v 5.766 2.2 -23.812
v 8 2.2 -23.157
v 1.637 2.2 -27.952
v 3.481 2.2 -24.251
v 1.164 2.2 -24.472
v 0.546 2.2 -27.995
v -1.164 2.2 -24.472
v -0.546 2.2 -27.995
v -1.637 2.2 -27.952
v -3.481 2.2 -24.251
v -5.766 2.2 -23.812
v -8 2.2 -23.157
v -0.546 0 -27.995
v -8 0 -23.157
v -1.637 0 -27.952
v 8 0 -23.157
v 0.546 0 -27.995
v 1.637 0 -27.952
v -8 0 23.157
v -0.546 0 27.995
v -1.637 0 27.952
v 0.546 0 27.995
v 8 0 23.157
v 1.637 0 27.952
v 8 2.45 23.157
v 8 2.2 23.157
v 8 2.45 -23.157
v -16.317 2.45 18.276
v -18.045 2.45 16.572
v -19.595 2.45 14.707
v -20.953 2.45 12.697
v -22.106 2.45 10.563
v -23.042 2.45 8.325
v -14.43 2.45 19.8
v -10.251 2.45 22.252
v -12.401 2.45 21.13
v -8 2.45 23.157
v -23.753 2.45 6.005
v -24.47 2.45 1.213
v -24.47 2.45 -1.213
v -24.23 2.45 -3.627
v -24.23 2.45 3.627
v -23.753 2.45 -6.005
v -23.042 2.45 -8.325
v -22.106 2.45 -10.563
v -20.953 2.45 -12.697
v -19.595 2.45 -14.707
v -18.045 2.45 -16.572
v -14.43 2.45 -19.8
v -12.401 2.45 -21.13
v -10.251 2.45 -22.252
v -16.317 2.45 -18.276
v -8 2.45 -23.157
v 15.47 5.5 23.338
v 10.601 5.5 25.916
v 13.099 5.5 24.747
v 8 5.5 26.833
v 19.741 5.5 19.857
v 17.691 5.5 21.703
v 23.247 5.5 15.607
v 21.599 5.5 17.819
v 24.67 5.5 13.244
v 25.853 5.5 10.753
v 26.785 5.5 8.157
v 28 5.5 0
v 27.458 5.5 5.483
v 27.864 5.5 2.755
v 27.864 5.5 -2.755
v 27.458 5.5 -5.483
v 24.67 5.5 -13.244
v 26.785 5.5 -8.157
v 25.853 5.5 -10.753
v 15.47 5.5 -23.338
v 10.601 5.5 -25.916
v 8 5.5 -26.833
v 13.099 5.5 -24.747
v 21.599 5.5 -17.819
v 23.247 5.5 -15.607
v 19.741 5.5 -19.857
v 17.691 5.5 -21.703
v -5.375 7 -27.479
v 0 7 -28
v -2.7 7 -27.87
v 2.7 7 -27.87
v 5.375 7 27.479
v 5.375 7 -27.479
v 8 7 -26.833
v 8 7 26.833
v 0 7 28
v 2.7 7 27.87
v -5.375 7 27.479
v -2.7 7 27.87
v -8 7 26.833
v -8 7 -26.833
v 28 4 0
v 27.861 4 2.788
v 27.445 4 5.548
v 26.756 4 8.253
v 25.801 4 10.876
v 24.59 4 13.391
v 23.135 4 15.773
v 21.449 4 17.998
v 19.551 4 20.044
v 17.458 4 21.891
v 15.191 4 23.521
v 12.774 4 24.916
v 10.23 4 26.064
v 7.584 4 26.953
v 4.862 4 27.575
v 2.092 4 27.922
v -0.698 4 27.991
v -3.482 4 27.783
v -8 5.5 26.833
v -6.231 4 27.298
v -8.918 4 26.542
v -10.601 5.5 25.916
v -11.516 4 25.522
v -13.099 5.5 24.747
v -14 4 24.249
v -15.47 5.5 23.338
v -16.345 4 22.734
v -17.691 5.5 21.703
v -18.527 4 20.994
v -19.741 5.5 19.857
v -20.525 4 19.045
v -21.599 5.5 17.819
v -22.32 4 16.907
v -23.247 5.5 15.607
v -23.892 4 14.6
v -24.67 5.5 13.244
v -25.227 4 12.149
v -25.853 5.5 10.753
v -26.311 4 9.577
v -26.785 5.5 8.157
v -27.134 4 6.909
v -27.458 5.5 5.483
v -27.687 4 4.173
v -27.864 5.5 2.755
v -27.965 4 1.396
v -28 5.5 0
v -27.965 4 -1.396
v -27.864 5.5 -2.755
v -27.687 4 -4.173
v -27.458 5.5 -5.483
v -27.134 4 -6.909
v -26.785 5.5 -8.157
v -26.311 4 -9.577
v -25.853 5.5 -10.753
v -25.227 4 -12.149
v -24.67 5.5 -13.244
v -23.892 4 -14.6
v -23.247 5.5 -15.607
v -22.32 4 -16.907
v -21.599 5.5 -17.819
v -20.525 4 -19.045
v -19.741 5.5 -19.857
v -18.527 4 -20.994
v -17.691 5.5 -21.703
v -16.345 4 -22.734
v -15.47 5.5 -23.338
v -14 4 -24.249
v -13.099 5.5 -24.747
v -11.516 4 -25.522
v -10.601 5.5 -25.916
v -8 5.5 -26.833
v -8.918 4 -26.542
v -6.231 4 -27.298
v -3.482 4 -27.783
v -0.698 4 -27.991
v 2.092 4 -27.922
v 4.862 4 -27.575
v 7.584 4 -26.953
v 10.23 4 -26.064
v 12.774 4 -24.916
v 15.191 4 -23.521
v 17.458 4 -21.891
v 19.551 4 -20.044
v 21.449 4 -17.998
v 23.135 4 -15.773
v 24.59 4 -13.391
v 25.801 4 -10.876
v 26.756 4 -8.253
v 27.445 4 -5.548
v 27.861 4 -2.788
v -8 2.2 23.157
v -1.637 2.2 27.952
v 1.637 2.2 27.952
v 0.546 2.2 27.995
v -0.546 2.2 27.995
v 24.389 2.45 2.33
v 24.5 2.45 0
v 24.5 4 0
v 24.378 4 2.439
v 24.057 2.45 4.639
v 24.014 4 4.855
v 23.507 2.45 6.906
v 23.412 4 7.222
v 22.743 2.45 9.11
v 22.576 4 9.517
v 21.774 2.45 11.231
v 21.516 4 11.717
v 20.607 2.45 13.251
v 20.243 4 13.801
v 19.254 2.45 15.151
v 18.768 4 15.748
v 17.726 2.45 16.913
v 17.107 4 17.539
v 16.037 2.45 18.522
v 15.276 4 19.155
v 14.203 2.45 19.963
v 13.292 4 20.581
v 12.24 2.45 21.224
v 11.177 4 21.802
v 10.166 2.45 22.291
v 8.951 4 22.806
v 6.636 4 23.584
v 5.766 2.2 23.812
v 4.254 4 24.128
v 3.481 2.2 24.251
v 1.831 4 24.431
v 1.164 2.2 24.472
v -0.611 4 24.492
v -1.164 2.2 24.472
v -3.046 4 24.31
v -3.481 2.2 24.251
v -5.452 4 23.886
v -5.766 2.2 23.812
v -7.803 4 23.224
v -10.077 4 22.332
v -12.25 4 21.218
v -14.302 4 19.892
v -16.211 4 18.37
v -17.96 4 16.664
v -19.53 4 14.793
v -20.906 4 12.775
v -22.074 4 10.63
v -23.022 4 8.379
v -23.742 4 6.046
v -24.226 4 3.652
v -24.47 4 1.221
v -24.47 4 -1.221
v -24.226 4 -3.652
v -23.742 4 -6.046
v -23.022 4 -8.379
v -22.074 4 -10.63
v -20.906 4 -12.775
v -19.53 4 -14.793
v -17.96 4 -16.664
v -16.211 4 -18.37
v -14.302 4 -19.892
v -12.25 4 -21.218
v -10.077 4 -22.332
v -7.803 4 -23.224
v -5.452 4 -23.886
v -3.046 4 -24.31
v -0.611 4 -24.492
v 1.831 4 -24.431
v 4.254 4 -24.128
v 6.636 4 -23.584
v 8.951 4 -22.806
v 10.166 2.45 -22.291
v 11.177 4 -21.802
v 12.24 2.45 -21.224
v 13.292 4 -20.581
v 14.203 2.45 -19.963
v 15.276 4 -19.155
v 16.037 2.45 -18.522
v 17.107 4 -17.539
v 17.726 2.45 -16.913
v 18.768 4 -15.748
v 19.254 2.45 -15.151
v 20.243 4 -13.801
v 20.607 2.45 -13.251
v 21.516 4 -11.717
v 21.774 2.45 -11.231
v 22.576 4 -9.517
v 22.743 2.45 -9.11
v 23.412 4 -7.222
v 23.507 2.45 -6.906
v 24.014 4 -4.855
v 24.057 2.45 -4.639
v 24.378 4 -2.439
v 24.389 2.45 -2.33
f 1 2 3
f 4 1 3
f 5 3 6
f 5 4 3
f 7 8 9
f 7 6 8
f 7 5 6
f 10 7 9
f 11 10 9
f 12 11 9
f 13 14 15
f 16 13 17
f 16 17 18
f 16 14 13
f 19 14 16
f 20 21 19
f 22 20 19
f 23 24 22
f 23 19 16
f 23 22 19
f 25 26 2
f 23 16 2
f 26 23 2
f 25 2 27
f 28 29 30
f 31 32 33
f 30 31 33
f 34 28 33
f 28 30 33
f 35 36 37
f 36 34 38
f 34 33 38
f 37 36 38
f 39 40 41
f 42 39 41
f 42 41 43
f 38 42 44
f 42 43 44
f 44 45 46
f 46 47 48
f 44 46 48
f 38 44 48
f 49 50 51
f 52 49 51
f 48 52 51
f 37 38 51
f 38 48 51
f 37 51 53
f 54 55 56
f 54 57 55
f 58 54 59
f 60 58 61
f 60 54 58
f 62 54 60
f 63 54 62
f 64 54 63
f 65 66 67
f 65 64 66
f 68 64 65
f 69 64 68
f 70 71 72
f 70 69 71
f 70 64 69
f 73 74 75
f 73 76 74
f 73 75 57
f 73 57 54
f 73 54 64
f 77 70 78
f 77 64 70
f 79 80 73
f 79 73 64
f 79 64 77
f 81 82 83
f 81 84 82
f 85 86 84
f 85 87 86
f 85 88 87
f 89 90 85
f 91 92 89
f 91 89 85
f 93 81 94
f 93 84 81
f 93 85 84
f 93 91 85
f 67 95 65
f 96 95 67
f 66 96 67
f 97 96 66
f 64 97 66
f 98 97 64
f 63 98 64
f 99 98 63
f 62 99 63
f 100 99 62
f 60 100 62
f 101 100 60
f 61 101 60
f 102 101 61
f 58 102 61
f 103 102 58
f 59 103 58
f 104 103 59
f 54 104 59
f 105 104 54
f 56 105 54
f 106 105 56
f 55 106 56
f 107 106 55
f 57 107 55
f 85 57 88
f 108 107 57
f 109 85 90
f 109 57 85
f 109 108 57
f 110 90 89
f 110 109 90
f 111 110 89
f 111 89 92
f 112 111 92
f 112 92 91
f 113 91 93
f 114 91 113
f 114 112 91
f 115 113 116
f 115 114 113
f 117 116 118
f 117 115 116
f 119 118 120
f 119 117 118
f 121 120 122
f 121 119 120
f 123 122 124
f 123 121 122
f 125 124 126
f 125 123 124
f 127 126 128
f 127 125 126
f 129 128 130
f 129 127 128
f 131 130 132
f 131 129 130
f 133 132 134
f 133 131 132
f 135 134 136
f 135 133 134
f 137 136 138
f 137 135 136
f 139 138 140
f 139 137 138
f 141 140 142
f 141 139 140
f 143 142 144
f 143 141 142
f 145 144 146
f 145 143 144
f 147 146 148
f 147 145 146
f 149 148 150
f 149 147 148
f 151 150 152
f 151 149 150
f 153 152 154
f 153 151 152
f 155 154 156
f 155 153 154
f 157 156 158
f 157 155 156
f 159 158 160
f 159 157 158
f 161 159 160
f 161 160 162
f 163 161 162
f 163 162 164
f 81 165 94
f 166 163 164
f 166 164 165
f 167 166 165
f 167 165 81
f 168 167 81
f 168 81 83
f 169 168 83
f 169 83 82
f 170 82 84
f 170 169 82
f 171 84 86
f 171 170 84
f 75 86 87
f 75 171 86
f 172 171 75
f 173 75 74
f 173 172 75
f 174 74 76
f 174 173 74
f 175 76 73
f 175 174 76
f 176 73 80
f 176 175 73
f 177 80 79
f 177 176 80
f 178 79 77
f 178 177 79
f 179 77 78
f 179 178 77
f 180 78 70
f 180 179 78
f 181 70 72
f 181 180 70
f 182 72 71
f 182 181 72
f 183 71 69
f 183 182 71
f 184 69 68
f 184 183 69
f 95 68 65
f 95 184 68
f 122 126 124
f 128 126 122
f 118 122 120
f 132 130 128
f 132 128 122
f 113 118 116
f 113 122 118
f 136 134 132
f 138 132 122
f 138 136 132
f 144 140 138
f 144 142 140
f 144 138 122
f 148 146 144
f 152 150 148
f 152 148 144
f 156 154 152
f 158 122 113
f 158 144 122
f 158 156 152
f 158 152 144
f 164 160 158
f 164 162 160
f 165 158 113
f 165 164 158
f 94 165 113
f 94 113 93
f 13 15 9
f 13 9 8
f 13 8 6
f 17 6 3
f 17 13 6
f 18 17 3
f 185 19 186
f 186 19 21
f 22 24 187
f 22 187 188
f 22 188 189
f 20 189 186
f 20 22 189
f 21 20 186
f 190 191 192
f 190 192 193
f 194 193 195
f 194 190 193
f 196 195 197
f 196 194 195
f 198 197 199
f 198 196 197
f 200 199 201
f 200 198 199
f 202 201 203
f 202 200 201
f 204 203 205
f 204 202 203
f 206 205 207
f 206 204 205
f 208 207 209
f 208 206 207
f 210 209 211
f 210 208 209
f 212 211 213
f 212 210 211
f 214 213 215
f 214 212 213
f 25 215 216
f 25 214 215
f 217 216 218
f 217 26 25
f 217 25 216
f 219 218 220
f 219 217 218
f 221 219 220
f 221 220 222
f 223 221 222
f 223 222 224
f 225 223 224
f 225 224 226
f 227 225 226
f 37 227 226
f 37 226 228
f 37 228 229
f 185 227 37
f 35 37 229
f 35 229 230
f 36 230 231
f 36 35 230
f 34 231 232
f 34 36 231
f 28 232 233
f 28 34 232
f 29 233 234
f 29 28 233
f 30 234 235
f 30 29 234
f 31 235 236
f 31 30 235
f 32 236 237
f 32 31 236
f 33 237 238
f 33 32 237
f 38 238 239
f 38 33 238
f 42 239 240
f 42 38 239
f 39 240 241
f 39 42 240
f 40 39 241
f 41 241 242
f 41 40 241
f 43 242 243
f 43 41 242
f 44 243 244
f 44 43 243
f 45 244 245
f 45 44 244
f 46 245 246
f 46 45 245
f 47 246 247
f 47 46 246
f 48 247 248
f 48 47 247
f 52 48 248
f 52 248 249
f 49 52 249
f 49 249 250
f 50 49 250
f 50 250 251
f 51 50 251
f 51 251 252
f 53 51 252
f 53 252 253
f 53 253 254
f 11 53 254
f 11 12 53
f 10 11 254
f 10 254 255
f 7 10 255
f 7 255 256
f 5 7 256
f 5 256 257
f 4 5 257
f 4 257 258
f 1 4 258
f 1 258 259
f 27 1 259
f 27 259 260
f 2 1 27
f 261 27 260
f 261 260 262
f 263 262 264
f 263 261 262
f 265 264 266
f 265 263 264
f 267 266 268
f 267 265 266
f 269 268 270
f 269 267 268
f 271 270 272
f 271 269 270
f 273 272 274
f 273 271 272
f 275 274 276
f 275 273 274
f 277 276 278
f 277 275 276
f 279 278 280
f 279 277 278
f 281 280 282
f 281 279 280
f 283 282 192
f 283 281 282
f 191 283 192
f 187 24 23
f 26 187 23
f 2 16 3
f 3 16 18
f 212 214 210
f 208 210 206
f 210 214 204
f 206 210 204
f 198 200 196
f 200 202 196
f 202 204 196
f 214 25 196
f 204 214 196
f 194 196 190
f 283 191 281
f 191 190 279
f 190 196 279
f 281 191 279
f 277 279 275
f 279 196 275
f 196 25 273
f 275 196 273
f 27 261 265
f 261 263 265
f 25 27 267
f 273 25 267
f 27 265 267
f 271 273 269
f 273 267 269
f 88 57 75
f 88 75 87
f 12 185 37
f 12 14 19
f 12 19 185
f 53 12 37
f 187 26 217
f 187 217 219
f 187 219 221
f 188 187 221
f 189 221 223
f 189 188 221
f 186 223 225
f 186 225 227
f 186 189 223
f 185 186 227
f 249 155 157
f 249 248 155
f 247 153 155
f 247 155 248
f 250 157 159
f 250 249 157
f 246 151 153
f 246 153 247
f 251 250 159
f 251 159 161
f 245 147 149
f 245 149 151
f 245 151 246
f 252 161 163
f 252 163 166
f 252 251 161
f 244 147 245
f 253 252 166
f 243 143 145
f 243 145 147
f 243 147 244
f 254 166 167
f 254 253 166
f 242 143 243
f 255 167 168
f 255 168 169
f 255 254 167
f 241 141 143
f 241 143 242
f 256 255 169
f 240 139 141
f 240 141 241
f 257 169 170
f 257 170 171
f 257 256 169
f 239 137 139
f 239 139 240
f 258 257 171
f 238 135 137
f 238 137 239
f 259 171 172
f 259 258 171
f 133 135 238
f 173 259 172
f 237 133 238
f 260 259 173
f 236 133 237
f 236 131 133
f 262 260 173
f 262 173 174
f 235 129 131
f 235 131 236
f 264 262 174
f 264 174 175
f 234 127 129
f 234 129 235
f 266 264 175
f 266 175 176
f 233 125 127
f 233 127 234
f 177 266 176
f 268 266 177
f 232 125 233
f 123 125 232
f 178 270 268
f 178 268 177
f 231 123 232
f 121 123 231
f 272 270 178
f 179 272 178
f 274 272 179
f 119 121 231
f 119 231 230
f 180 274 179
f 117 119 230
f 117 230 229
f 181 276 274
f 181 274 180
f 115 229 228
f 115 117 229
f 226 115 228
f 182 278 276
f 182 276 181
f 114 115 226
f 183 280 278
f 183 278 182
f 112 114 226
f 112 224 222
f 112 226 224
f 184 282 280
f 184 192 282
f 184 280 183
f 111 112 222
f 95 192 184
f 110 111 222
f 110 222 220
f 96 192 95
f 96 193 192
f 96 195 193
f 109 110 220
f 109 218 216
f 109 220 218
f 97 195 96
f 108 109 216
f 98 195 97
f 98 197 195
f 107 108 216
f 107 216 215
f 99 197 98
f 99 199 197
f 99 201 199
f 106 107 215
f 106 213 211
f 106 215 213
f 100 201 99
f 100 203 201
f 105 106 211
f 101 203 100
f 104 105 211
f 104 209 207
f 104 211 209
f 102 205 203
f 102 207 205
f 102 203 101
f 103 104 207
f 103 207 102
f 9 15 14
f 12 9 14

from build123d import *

# Parameters (mm, degrees)
SKETCH_2_W               = 20
SKETCH_2_H               = 1.5
SKETCH_2_H_2             = 2.45
CUT_EXTRUDE_1_DEPTH      = 29
CUT_EXTRUDE_1_DEPTH_BACK = 29
CUT_EXTRUDE_2_DEPTH      = 2.45


with BuildPart() as part:
    # Эскиз1 → Повернуть1 (revolve)
    with BuildSketch(Plane.XY):
        Polygon((0, 0), (0, 7), (28, 7), (28, 4), (24.5, 4), (24.5, 2.2), (28, 2.2), (28, 0), align=None)
    revolve(axis=Axis((0, 16.311603896, 0), (0, -1, 0)))

    # Эскиз2 → Вырез-Вытянуть1 (cut, two sides)
    with BuildSketch(Plane.XY) as cut_extrude_1_sk:
        with Locations((18, 6.25)):
            Rectangle(SKETCH_2_W, SKETCH_2_H)
        with Locations((-18, 6.25)):
            Rectangle(SKETCH_2_W, SKETCH_2_H)
        with Locations((18, 1.225)):
            Rectangle(SKETCH_2_W, SKETCH_2_H_2)
        with Locations((-18, 1.225)):
            Rectangle(SKETCH_2_W, SKETCH_2_H_2)
    extrude(amount=CUT_EXTRUDE_1_DEPTH, mode=Mode.SUBTRACT)
    extrude(cut_extrude_1_sk.sketch, amount=-CUT_EXTRUDE_1_DEPTH_BACK, mode=Mode.SUBTRACT)

    # Эскиз3 → Вырез-Вытянуть2 (cut)
    with BuildSketch(Plane.XZ):
        with BuildLine():
            ThreePointArc((8, 26.83281573), (4.850771024, 27.576620904), (1.636756478, 27.952120281))
            Line((1.636756478, 27.952120281), (8, 23.157072354))
            Line((8, 23.157072354), (8, 26.83281573))
        make_face()
        with BuildLine():
            Line((-8, 26.83281573), (-8, 23.157072354))
            Line((-8, 23.157072354), (-1.636756478, 27.952120281))
            ThreePointArc((-1.636756478, 27.952120281), (-4.850771024, 27.576620904), (-8, 26.83281573))
        make_face()
        with BuildLine():
            Line((-1.636756478, -27.952120281), (-8, -23.157072354))
            Line((-8, -23.157072354), (-8, -26.83281573))
            ThreePointArc((-8, -26.83281573), (-4.850771024, -27.576620904), (-1.636756478, -27.952120281))
        make_face()
        with BuildLine():
            Line((8, -23.157072354), (1.636756478, -27.952120281))
            ThreePointArc((1.636756478, -27.952120281), (4.850771024, -27.576620904), (8, -26.83281573))
            Line((8, -26.83281573), (8, -23.157072354))
        make_face()
    extrude(amount=-CUT_EXTRUDE_2_DEPTH, mode=Mode.SUBTRACT)


solid = part.part
